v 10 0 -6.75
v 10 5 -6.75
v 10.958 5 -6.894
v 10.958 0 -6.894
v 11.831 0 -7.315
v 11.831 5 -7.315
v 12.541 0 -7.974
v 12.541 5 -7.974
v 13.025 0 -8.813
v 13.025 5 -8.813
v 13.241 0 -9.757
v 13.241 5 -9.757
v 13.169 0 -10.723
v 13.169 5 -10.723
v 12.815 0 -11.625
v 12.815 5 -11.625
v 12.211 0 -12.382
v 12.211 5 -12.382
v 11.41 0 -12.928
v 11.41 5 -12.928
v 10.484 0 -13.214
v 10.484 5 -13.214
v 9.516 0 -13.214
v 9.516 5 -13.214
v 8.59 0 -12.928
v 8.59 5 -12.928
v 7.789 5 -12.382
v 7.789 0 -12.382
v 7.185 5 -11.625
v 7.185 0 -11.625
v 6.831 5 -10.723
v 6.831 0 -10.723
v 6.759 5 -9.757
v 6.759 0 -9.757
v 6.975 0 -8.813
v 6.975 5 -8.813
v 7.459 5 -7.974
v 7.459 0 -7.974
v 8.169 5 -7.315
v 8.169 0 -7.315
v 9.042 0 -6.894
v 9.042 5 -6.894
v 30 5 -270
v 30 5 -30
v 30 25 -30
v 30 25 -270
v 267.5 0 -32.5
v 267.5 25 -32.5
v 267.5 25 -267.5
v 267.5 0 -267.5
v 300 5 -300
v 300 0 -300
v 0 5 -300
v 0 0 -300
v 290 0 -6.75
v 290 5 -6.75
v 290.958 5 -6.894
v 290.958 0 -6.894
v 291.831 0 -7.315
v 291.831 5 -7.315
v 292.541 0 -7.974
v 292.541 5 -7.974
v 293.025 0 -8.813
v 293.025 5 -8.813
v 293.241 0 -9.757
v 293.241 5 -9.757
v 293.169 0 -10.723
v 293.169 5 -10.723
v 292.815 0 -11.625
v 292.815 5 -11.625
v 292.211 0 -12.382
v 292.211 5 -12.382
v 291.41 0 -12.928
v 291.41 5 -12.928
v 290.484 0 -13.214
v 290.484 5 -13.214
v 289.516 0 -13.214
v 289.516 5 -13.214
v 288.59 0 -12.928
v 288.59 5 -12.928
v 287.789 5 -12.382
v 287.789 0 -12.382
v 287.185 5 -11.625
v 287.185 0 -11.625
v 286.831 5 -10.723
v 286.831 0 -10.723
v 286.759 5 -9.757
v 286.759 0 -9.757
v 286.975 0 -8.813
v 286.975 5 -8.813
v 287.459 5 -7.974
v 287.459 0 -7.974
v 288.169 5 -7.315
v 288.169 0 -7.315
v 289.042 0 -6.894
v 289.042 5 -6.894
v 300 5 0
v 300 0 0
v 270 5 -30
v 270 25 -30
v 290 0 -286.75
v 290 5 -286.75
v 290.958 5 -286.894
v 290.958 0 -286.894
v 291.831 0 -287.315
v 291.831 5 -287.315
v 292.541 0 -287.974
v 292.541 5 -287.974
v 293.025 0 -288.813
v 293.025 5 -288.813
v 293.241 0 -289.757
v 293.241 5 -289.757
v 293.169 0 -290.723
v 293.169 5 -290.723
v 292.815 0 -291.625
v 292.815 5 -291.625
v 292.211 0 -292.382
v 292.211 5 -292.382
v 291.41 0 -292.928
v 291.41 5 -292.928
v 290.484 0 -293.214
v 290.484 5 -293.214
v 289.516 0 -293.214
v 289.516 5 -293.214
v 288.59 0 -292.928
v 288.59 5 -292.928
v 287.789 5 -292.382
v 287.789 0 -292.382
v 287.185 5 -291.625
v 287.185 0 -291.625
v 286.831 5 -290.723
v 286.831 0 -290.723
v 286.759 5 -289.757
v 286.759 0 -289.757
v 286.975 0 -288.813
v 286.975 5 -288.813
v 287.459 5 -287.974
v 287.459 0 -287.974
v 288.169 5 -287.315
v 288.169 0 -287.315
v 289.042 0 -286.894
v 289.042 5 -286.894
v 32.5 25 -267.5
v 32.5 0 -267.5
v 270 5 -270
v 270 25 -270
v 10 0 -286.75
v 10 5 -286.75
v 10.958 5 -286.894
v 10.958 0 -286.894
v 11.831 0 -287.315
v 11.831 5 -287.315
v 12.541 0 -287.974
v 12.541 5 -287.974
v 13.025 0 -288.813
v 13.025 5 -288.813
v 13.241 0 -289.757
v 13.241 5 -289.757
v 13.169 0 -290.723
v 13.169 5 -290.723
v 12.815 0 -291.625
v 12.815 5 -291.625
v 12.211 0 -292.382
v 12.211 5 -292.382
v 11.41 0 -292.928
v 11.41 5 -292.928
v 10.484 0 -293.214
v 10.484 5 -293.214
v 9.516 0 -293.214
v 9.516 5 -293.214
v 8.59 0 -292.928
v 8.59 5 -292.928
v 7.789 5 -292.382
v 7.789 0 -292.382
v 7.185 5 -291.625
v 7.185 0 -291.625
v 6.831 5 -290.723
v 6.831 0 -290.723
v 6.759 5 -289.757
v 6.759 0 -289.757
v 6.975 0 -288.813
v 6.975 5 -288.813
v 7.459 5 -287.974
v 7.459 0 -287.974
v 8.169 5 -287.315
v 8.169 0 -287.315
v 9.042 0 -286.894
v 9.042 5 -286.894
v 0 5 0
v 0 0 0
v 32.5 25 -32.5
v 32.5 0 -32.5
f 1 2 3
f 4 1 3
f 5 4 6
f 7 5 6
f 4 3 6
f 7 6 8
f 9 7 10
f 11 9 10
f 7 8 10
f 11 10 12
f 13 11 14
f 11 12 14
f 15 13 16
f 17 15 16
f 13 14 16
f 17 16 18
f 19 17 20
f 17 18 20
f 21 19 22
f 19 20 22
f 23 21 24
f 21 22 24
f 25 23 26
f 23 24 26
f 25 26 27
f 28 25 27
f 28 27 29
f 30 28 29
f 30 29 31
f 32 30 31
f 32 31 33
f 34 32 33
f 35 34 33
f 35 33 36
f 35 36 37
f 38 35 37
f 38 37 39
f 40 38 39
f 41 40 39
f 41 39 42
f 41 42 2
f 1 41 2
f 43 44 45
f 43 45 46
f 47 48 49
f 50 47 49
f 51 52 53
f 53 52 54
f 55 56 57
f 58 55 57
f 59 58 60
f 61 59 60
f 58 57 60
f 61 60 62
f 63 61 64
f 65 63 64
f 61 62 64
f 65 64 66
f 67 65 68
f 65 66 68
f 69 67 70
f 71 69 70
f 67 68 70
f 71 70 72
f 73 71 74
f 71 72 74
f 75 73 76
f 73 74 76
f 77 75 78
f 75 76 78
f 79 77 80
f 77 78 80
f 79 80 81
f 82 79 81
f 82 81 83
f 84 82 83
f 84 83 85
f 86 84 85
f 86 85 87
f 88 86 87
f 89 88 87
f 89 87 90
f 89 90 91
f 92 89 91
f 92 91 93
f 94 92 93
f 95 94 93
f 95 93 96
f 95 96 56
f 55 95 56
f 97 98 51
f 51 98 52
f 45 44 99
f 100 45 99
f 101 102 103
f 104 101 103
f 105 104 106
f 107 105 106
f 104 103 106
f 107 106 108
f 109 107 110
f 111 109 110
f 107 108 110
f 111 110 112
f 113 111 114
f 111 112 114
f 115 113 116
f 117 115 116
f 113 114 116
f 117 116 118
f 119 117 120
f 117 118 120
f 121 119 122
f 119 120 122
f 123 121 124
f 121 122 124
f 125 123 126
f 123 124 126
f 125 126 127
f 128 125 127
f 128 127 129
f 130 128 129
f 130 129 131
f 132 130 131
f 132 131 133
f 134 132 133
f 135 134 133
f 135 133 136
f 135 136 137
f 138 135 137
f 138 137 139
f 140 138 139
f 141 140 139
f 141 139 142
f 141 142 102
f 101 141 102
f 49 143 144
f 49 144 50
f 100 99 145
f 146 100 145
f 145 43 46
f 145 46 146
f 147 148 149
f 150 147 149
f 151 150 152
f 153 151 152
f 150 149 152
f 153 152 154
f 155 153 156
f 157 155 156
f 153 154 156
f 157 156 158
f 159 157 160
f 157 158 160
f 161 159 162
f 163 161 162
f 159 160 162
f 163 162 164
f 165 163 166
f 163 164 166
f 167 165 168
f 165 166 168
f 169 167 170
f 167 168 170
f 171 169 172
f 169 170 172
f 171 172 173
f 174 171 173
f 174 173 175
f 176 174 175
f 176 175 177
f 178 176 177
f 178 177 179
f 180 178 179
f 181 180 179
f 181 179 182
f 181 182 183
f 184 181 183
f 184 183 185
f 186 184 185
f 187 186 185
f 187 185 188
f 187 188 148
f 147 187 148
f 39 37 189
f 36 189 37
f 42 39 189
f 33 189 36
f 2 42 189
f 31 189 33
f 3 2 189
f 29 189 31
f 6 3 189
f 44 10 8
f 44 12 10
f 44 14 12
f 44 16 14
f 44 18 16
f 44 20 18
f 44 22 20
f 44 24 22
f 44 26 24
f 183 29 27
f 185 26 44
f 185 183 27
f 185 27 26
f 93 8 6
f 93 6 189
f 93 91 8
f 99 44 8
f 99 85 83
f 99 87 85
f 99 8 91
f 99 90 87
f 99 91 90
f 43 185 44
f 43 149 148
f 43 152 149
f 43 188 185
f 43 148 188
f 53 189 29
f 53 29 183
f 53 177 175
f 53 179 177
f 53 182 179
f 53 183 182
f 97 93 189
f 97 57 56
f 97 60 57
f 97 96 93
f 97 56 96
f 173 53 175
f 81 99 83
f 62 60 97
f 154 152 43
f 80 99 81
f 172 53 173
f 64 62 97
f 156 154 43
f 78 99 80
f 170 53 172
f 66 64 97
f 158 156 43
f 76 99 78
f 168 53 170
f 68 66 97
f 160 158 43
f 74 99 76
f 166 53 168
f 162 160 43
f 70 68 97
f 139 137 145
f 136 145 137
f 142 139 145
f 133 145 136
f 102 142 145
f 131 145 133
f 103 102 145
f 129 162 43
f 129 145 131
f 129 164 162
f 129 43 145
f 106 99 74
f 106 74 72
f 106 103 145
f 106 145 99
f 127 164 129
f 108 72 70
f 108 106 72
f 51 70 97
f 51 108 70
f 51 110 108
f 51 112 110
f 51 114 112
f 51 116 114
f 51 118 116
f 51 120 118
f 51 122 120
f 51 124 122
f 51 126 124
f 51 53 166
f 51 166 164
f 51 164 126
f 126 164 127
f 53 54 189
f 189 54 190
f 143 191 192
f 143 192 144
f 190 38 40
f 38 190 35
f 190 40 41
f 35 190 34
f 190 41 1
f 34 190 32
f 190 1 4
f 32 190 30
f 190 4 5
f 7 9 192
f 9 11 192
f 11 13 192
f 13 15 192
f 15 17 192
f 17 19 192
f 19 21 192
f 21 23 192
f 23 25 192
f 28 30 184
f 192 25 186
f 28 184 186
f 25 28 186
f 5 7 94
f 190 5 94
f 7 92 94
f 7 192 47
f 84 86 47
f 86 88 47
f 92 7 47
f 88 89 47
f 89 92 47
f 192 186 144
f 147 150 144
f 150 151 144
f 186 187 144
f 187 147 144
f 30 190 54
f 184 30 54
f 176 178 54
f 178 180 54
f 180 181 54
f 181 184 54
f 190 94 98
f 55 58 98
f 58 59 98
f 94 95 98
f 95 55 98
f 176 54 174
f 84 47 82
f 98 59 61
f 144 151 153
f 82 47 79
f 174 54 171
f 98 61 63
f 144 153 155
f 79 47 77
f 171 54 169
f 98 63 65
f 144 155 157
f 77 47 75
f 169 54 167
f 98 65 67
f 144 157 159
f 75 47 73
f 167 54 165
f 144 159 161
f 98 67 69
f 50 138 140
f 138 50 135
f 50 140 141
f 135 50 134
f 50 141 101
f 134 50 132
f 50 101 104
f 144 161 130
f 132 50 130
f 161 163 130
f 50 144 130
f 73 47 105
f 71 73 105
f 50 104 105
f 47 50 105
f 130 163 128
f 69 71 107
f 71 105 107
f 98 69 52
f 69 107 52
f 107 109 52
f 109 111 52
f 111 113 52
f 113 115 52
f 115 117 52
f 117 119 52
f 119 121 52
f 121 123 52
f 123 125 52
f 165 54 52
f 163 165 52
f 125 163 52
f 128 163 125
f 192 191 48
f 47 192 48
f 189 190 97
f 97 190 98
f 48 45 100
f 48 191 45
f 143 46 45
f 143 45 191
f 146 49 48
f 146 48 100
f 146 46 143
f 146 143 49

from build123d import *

# Parameters (mm, degrees)
BOSS_EXTRUDE1_DEPTH = 5
SKETCH4_W           = 240
SKETCH4_H           = 240
SKETCH4_W_2         = 230.5
SKETCH4_H_2         = 230.5
BOSS_EXTRUDE2_DEPTH = 20
SKETCH6_R           = 3.25
CUT_EXTRUDE1_DEPTH  = 20
SKETCH7_W           = 240
SKETCH7_H           = 240
CUT_EXTRUDE2_DEPTH  = 20
SKETCH8_W           = 240
SKETCH8_H           = 240
SKETCH8_W_2         = 235
SKETCH8_H_2         = 235
BOSS_EXTRUDE3_DEPTH = 20
SKETCH9_W           = 235
SKETCH9_H           = 235
CUT_EXTRUDE3_DEPTH  = 20


with BuildPart() as part:
    # Sketch3 → Boss-Extrude1 (new body)
    with BuildSketch(Plane(origin=(0, 0, 0), x_dir=(1, 0, 0), z_dir=(0, 1, 0))):
        Polygon((300, 300), (150, 150), (300, 0), align=None)
        Polygon((150, 150), (0, 0), (300, 0), align=None)
        Polygon((0, 300), (0, 0), (150, 150), align=None)
        Polygon((0, 300), (150, 150), (300, 300), align=None)
    extrude(amount=BOSS_EXTRUDE1_DEPTH)

    # Sketch4 → Boss-Extrude2 (add)
    with BuildSketch(Plane(origin=(0, 5, 0), x_dir=(1, 0, 0), z_dir=(0, 1, 0))):
        with Locations((150, 150)):
            Rectangle(SKETCH4_W, SKETCH4_H)
        with Locations((150, 150)):
            Rectangle(SKETCH4_W_2, SKETCH4_H_2, mode=Mode.SUBTRACT)
    extrude(amount=BOSS_EXTRUDE2_DEPTH)

    # Sketch6 → Cut-Extrude1 (cut)
    with BuildSketch(Plane(origin=(0, 5, 0), x_dir=(1, 0, 0), z_dir=(0, 1, 0))):
        with Locations(Location((10, 10, 0), (0, 0, 270))):
            Circle(SKETCH6_R)
        with Locations(Location((290, 10, 0), (0, 0, 270))):
            Circle(SKETCH6_R)
        with Locations(Location((290, 290, 0), (0, 0, 270))):
            Circle(SKETCH6_R)
        with Locations(Location((10, 290, 0), (0, 0, 270))):
            Circle(SKETCH6_R)
    extrude(amount=-CUT_EXTRUDE1_DEPTH, mode=Mode.SUBTRACT)

    # Sketch7 → Cut-Extrude2 (cut)
    with BuildSketch(Plane(origin=(0, 25, 0), x_dir=(1, 0, 0), z_dir=(0, 1, 0))):
        with Locations((150, 150)):
            Rectangle(SKETCH7_W, SKETCH7_H)
    extrude(amount=-CUT_EXTRUDE2_DEPTH, mode=Mode.SUBTRACT)

    # Sketch8 → Boss-Extrude3 (add)
    with BuildSketch(Plane(origin=(0, 5, 0), x_dir=(1, 0, 0), z_dir=(0, 1, 0))):
        with Locations((150, 150)):
            Rectangle(SKETCH8_W, SKETCH8_H)
        with Locations((150, 150)):
            Rectangle(SKETCH8_W_2, SKETCH8_H_2, mode=Mode.SUBTRACT)
    extrude(amount=BOSS_EXTRUDE3_DEPTH)

    # Sketch9 → Cut-Extrude3 (cut)
    with BuildSketch(Plane(origin=(0, 5, 0), x_dir=(1, 0, 0), z_dir=(0, 1, 0))):
        with Locations((150, 150)):
            Rectangle(SKETCH9_W, SKETCH9_H)
    extrude(amount=-CUT_EXTRUDE3_DEPTH, mode=Mode.SUBTRACT)


solid = part.part
